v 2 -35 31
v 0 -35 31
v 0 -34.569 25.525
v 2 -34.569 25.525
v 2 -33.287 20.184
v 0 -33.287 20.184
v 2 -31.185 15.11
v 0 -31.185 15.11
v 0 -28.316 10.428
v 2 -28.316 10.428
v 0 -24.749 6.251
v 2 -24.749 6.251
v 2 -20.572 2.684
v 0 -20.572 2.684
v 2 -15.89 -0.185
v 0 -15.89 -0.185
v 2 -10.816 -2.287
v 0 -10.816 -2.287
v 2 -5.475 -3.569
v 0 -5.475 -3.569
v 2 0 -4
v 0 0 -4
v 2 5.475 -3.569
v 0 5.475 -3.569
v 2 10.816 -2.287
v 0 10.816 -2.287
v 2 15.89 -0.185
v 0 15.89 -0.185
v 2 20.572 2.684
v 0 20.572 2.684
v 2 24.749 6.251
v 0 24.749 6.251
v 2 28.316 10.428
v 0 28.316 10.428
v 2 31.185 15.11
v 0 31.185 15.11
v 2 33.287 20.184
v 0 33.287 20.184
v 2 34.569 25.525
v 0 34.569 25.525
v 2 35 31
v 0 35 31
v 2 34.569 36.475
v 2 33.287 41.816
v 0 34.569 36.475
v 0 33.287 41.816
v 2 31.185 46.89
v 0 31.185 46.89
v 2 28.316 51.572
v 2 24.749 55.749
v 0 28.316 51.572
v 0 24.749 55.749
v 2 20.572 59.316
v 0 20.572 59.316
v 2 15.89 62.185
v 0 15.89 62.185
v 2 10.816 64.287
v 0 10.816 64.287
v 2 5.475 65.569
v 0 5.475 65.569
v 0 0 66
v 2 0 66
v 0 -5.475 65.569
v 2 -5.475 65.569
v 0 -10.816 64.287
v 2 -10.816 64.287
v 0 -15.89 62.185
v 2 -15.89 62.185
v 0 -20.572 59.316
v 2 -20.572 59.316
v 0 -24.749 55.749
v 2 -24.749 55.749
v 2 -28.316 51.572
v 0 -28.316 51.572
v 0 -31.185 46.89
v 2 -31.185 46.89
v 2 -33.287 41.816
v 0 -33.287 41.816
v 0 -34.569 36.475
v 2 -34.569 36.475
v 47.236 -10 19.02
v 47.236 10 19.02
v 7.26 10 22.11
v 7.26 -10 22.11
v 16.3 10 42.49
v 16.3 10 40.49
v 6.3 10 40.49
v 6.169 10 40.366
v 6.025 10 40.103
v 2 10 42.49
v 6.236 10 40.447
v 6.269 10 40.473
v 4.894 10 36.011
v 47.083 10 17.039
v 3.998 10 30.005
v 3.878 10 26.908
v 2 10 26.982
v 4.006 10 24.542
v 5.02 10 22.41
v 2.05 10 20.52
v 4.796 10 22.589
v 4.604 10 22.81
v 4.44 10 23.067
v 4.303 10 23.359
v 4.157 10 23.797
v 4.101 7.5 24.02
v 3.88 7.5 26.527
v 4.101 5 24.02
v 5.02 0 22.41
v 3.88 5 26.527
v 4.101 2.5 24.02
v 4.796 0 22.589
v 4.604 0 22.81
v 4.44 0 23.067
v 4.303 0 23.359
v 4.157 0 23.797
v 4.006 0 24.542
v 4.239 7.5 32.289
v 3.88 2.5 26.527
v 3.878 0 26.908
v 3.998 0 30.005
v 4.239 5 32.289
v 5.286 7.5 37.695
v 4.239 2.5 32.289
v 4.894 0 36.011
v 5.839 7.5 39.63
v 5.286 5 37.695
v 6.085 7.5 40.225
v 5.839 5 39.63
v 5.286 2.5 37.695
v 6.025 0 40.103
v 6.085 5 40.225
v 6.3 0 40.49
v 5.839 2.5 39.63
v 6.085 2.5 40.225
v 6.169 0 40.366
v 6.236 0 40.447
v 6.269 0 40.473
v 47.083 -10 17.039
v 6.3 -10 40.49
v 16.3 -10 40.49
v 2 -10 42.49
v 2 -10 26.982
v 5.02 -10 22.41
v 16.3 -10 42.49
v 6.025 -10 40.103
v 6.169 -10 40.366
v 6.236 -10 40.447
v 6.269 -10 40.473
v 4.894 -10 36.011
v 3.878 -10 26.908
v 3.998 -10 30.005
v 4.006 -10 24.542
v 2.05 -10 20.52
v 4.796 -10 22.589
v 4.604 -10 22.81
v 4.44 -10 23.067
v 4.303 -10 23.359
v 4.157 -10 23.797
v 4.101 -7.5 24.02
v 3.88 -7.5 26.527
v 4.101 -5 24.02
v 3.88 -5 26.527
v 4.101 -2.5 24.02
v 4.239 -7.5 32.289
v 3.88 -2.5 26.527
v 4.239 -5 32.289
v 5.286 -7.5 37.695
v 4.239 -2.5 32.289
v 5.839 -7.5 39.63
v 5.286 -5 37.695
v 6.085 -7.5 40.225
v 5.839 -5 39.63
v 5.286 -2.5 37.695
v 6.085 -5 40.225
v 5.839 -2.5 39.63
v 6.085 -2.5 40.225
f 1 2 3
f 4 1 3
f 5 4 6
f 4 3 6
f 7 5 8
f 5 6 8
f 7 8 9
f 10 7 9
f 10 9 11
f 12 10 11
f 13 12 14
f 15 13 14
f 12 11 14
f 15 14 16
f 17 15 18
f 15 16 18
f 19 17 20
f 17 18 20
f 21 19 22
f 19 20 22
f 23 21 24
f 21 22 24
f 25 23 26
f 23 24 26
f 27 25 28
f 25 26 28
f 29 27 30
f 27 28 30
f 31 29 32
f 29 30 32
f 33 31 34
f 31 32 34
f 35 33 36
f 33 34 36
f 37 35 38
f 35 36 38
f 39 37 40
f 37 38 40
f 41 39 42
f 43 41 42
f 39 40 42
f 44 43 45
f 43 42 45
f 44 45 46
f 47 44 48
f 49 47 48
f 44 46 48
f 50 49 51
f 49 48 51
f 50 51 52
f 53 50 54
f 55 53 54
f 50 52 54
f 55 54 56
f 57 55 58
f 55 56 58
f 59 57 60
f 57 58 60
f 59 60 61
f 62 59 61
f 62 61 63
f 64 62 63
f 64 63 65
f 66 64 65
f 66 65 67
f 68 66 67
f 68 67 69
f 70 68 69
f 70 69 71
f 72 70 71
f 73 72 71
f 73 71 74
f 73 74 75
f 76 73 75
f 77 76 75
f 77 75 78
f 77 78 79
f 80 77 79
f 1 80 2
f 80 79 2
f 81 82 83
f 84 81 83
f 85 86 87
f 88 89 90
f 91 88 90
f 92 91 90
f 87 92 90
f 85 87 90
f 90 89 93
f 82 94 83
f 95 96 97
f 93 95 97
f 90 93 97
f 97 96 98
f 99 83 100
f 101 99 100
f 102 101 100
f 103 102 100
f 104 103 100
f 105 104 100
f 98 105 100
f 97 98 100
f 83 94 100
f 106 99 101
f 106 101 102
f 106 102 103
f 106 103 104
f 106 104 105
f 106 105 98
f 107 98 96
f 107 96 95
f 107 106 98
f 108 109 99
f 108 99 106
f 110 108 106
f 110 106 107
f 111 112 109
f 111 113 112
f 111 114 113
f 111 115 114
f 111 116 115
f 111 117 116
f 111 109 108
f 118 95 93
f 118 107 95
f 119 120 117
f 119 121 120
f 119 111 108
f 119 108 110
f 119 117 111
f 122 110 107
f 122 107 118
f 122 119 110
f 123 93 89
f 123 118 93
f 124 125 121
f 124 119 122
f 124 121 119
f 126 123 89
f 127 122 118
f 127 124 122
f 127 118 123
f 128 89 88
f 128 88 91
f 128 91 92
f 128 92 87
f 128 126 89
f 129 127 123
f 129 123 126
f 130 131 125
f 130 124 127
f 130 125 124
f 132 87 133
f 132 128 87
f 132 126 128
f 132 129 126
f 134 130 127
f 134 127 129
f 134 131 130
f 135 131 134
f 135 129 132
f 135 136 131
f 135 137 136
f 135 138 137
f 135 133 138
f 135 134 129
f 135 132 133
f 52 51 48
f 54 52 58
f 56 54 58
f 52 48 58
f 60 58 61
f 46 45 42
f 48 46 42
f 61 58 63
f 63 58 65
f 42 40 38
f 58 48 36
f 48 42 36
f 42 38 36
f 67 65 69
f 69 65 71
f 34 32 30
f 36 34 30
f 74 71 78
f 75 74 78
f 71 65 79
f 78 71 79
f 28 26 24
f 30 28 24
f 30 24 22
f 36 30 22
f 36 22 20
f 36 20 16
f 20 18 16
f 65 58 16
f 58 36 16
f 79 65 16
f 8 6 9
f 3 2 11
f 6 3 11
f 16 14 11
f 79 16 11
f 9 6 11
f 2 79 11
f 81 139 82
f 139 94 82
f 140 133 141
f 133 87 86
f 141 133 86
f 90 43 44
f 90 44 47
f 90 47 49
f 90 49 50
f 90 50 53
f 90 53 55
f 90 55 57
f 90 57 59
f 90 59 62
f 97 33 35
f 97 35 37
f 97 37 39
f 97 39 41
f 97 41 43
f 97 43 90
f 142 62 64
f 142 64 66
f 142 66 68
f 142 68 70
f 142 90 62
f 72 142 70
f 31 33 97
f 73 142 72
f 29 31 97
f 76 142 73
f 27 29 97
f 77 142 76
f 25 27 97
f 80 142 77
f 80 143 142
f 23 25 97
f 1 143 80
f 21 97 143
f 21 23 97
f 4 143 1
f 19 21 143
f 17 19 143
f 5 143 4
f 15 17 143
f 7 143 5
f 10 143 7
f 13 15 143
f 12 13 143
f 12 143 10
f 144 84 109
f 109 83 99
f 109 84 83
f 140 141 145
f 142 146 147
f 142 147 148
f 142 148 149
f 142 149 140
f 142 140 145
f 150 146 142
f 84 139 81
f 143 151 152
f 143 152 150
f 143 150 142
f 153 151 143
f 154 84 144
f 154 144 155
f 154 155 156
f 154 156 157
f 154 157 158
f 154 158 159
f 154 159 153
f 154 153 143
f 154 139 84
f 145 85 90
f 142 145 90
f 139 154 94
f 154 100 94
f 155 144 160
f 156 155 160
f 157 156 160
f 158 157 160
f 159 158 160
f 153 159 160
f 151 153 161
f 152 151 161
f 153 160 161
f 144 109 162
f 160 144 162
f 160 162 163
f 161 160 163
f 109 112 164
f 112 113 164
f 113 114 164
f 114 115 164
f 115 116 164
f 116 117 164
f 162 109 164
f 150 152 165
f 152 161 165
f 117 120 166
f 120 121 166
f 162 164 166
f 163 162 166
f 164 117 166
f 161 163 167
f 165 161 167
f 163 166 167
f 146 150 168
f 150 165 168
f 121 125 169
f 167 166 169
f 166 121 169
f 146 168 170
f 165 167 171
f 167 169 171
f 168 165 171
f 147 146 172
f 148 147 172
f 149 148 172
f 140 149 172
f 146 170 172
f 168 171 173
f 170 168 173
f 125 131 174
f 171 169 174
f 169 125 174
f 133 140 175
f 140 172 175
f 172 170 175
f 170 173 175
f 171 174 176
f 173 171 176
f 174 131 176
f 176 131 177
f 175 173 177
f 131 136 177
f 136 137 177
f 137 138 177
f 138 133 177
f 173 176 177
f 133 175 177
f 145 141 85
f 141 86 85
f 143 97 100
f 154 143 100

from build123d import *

# Parameters (mm, degrees)
CYLINDER001_R             = 35
CYLINDER001_DEPTH         = 2
PAD002_DEPTH              = 10
FUSION002_PLACEMENT_ANGLE = 270


with BuildPart() as cilindro_grande:
    # Cylinder001 → Cylinder001 (new body)
    with BuildSketch(Plane(origin=(-16.3, 0, 0), x_dir=(0, 0, -1), z_dir=(1, 0, 0))):
        Circle(CYLINDER001_R)
    extrude(amount=CYLINDER001_DEPTH)


with BuildPart() as soporte_tv_plano:
    # Sketch005 → Pad002 (new body, symmetric)
    with BuildSketch(Plane.XY):
        with BuildLine():
            add(Edge.make_bspline(
                [(-11.28, 8.59), (-12.232885, 7.961762), (-12.561857, 4.634312), (-12.202327, -1.322686), (-10.996973, -7.076074), (-10.262423, -9.386153), (-10, -9.49)],
                knots=[0, 0, 0, 0, 0.25, 0.5, 0.75, 1, 1, 1, 1], degree=3))
            Line((-10, -9.49), (0, -9.49))
            Line((0, -9.49), (0, -11.49))
            Line((0, -11.49), (-14.42, -11.49))
            Line((-14.42, -11.49), (-14.25, 10.48))
            Line((-14.25, 10.48), (30.7825887629, 13.9608816937))
            Line((30.7825887629, 13.9608816937), (30.9357048732, 11.98))
            Line((30.9357048732, 11.98), (-9.04, 8.89))
            Line((-9.04, 8.89), (-11.28, 8.59))
        make_face()
    extrude(amount=PAD002_DEPTH, both=True)

    # Fusion002: union cilindro_grande
    add(cilindro_grande.part)


with BuildPart() as soporte_tv_plano_1:
    # Fusion002 placement: moved
    add(soporte_tv_plano.part.moved(Location((16.3, 0, 31))).rotate(Axis((16.3, 0, 31), (1, 0, 0)), FUSION002_PLACEMENT_ANGLE))


solid = soporte_tv_plano_1.part
